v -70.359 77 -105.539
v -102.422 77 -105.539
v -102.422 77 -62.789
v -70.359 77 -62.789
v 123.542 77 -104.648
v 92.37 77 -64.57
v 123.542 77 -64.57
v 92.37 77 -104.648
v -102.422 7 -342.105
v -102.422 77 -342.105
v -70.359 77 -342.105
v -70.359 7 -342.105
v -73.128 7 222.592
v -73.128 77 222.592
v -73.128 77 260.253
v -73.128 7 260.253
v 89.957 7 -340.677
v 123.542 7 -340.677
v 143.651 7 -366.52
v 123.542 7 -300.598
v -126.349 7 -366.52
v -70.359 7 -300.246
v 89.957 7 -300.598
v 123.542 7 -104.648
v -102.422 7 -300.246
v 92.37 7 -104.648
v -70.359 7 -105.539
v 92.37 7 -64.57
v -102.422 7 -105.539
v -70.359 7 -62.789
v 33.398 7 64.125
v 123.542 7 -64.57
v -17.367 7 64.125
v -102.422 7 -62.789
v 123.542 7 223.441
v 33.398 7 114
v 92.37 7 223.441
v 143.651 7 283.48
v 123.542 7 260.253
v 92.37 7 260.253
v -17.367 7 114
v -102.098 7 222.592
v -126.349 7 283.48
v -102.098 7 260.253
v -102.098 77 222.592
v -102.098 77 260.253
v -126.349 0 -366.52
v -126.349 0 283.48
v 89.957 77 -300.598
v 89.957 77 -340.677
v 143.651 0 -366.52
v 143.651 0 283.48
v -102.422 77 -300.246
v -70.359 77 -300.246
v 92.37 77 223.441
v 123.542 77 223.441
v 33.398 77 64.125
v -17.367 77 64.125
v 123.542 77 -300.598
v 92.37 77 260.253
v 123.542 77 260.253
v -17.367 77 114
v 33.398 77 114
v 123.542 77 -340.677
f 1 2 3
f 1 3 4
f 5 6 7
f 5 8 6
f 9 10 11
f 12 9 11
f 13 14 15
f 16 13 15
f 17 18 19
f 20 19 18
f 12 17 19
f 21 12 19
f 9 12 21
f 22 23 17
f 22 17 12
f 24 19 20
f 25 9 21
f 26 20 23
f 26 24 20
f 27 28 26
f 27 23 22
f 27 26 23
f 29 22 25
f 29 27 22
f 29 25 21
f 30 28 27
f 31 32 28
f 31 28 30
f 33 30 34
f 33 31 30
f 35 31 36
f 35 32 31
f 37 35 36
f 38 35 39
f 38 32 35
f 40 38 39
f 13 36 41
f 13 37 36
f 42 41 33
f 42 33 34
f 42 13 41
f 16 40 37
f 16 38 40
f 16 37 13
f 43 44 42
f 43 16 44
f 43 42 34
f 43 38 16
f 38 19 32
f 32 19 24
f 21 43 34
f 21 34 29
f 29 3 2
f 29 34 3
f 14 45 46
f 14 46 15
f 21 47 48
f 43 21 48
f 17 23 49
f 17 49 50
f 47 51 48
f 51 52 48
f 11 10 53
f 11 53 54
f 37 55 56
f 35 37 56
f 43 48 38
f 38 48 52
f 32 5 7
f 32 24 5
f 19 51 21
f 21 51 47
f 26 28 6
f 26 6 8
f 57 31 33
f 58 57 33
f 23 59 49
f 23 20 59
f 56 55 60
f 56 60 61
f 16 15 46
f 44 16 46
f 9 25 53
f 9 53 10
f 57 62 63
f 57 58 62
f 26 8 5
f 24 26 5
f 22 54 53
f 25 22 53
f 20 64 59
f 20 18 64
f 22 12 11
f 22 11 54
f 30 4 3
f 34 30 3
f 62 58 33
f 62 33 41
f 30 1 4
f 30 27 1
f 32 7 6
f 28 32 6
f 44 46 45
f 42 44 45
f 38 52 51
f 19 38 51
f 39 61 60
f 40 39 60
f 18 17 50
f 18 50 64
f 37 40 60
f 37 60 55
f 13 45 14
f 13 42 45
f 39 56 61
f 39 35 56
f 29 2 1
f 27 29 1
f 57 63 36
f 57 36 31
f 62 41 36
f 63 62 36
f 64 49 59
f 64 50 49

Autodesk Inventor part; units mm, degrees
ref_plane "YZ Plane" through (0, 0, 0) normal (1, 0, 0) x (0, 1, 0)
ref_plane "XZ Plane" through (0, 0, 0) normal (0, 1, 0) x (-1, 0, 0)
ref_plane "XY Plane" through (0, 0, 0) normal (0, 0, 1) x (1, 0, 0)
sketch "Sketch1" plane through (0, 0, 0) normal (0, 1, 0) x (-1, 0, 0)
  line L0 (126.3491, 283.4802) -> (-143.6509, 283.4802)
  line L1 (-143.6509, 283.4802) -> (-143.6509, -366.5198)
  line L2 (-143.6509, -366.5198) -> (126.3491, -366.5198)
  line L3 (126.3491, -366.5198) -> (126.3491, 283.4802)
  point P0 (0, 0)
  dimension "d0" = 650
  dimension "d1" = 270
extrude "Extrusion1" add sketch "Sketch1" along normal blind 7
sketch "Sketch2" plane through (0, 0, 0) normal (0, -1, 0) x (1, 0, 0)
  line L0 (-101.3766, -334.6757) -> (-65.0758, -334.6757)
  line L1 (-65.0758, -334.6757) -> (-65.0758, -293.0626)
  line L2 (-65.0758, -293.0626) -> (-101.3766, -293.0626)
  line L3 (-101.3766, -293.0626) -> (-101.3766, -334.6757)
  line L4 (-97.1426, 224.249) -> (-79.8855, 224.249)
  line L5 (-79.8855, 224.249) -> (-79.8855, 190.7676)
  line L6 (-79.8855, 190.7676) -> (-97.1426, 190.7676)
  line L7 (-97.1426, 190.7676) -> (-97.1426, 224.249)
  line L8 (-106.8404, 242.9144) -> (-83.2262, 242.9144)
  line L9 (-83.2262, 242.9144) -> (-83.2262, 210.6642)
  line L10 (-83.2262, 210.6642) -> (-106.8404, 210.6642)
  line L11 (-106.8404, 210.6642) -> (-106.8404, 242.9144)
  point P0 (0, 0)
sketch "Sketch3" plane through (0, 7, 0) normal (0, 1, 0) x (1, 0, 0)
  line L0 (-102.0983, -222.5922) -> (-73.128, -222.5922)
  line L1 (-73.128, -222.5922) -> (-73.128, -260.2535)
  line L2 (-73.128, -260.2535) -> (-102.0983, -260.2535)
  line L3 (-102.0983, -260.2535) -> (-102.0983, -222.5922)
  point P0 (0, 0)
extrude "Extrusion2" add sketch "Sketch3" along normal blind 70 and the other way blind 5
sketch "Sketch4" plane through (0, 7, 0) normal (0, 1, 0) x (1, 0, 0)
  line L0 (123.5415, -260.2535) -> (92.3696, -260.2535)
  line L1 (92.3696, -260.2535) -> (92.3696, -223.4411)
  line L2 (92.3696, -223.4411) -> (123.5415, -223.4411)
  line L3 (123.5415, -223.4411) -> (123.5415, -260.2535)
  point P0 (0, 0)
extrude "Extrusion3" add sketch "Sketch4" along normal blind 70
sketch "Sketch5" plane through (0, 7, 0) normal (0, 1, 0) x (1, 0, 0)
  line L0 (123.5415, 64.5703) -> (92.3696, 64.5703)
  line L1 (92.3696, 64.5703) -> (92.3696, 104.6485)
  line L2 (92.3696, 104.6485) -> (123.5415, 104.6485)
  line L3 (123.5415, 104.6485) -> (123.5415, 64.5703)
  point P0 (0, 0)
extrude "Extrusion4" add sketch "Sketch5" along normal blind 70
sketch "Sketch6" plane through (0, 7, 0) normal (0, 1, 0) x (1, 0, 0)
  line L0 (-70.3594, 62.7891) -> (-102.4219, 62.7891)
  line L1 (-102.4219, 62.7891) -> (-102.4219, 105.5391)
  line L2 (-102.4219, 105.5391) -> (-70.3594, 105.5391)
  line L3 (-70.3594, 105.5391) -> (-70.3594, 62.7891)
  point P0 (0, 0)
extrude "Extrusion5" add sketch "Sketch6" along normal blind 70
sketch "Sketch7" plane through (0, 7, 0) normal (0, 1, 0) x (1, 0, 0)
  line L0 (-102.4219, 342.1053) -> (-70.3594, 342.1053)
  line L1 (-70.3594, 342.1053) -> (-70.3594, 300.246)
  line L2 (-70.3594, 300.246) -> (-102.4219, 300.246)
  line L3 (-102.4219, 300.246) -> (-102.4219, 342.1053)
  point P0 (0, 0)
extrude "Extrusion6" add sketch "Sketch7" along normal blind 70
sketch "Sketch8" plane through (0, 7, 0) normal (0, 1, 0) x (1, 0, 0)
  line L0 (123.5415, 300.5975) -> (89.9566, 300.5975)
  line L1 (89.9566, 300.5975) -> (89.9566, 340.6771)
  line L2 (89.9566, 340.6771) -> (123.5415, 340.6771)
  line L3 (123.5415, 340.6771) -> (123.5415, 300.5975)
  point P0 (0, 0)
extrude "Extrusion7" add sketch "Sketch8" along normal blind 70
sketch "Sketch9" plane through (0, 7, 0) normal (0, 1, 0) x (1, 0, 0)
  line L0 (33.3984, -64.125) -> (-17.3672, -64.125)
  line L1 (-17.3672, -64.125) -> (-17.3672, -114)
  line L2 (-17.3672, -114) -> (33.3984, -114)
  line L3 (33.3984, -114) -> (33.3984, -64.125)
  point P0 (0, 0)
extrude "Extrusion8" add sketch "Sketch9" along normal blind 70
properties part number "cstand"
